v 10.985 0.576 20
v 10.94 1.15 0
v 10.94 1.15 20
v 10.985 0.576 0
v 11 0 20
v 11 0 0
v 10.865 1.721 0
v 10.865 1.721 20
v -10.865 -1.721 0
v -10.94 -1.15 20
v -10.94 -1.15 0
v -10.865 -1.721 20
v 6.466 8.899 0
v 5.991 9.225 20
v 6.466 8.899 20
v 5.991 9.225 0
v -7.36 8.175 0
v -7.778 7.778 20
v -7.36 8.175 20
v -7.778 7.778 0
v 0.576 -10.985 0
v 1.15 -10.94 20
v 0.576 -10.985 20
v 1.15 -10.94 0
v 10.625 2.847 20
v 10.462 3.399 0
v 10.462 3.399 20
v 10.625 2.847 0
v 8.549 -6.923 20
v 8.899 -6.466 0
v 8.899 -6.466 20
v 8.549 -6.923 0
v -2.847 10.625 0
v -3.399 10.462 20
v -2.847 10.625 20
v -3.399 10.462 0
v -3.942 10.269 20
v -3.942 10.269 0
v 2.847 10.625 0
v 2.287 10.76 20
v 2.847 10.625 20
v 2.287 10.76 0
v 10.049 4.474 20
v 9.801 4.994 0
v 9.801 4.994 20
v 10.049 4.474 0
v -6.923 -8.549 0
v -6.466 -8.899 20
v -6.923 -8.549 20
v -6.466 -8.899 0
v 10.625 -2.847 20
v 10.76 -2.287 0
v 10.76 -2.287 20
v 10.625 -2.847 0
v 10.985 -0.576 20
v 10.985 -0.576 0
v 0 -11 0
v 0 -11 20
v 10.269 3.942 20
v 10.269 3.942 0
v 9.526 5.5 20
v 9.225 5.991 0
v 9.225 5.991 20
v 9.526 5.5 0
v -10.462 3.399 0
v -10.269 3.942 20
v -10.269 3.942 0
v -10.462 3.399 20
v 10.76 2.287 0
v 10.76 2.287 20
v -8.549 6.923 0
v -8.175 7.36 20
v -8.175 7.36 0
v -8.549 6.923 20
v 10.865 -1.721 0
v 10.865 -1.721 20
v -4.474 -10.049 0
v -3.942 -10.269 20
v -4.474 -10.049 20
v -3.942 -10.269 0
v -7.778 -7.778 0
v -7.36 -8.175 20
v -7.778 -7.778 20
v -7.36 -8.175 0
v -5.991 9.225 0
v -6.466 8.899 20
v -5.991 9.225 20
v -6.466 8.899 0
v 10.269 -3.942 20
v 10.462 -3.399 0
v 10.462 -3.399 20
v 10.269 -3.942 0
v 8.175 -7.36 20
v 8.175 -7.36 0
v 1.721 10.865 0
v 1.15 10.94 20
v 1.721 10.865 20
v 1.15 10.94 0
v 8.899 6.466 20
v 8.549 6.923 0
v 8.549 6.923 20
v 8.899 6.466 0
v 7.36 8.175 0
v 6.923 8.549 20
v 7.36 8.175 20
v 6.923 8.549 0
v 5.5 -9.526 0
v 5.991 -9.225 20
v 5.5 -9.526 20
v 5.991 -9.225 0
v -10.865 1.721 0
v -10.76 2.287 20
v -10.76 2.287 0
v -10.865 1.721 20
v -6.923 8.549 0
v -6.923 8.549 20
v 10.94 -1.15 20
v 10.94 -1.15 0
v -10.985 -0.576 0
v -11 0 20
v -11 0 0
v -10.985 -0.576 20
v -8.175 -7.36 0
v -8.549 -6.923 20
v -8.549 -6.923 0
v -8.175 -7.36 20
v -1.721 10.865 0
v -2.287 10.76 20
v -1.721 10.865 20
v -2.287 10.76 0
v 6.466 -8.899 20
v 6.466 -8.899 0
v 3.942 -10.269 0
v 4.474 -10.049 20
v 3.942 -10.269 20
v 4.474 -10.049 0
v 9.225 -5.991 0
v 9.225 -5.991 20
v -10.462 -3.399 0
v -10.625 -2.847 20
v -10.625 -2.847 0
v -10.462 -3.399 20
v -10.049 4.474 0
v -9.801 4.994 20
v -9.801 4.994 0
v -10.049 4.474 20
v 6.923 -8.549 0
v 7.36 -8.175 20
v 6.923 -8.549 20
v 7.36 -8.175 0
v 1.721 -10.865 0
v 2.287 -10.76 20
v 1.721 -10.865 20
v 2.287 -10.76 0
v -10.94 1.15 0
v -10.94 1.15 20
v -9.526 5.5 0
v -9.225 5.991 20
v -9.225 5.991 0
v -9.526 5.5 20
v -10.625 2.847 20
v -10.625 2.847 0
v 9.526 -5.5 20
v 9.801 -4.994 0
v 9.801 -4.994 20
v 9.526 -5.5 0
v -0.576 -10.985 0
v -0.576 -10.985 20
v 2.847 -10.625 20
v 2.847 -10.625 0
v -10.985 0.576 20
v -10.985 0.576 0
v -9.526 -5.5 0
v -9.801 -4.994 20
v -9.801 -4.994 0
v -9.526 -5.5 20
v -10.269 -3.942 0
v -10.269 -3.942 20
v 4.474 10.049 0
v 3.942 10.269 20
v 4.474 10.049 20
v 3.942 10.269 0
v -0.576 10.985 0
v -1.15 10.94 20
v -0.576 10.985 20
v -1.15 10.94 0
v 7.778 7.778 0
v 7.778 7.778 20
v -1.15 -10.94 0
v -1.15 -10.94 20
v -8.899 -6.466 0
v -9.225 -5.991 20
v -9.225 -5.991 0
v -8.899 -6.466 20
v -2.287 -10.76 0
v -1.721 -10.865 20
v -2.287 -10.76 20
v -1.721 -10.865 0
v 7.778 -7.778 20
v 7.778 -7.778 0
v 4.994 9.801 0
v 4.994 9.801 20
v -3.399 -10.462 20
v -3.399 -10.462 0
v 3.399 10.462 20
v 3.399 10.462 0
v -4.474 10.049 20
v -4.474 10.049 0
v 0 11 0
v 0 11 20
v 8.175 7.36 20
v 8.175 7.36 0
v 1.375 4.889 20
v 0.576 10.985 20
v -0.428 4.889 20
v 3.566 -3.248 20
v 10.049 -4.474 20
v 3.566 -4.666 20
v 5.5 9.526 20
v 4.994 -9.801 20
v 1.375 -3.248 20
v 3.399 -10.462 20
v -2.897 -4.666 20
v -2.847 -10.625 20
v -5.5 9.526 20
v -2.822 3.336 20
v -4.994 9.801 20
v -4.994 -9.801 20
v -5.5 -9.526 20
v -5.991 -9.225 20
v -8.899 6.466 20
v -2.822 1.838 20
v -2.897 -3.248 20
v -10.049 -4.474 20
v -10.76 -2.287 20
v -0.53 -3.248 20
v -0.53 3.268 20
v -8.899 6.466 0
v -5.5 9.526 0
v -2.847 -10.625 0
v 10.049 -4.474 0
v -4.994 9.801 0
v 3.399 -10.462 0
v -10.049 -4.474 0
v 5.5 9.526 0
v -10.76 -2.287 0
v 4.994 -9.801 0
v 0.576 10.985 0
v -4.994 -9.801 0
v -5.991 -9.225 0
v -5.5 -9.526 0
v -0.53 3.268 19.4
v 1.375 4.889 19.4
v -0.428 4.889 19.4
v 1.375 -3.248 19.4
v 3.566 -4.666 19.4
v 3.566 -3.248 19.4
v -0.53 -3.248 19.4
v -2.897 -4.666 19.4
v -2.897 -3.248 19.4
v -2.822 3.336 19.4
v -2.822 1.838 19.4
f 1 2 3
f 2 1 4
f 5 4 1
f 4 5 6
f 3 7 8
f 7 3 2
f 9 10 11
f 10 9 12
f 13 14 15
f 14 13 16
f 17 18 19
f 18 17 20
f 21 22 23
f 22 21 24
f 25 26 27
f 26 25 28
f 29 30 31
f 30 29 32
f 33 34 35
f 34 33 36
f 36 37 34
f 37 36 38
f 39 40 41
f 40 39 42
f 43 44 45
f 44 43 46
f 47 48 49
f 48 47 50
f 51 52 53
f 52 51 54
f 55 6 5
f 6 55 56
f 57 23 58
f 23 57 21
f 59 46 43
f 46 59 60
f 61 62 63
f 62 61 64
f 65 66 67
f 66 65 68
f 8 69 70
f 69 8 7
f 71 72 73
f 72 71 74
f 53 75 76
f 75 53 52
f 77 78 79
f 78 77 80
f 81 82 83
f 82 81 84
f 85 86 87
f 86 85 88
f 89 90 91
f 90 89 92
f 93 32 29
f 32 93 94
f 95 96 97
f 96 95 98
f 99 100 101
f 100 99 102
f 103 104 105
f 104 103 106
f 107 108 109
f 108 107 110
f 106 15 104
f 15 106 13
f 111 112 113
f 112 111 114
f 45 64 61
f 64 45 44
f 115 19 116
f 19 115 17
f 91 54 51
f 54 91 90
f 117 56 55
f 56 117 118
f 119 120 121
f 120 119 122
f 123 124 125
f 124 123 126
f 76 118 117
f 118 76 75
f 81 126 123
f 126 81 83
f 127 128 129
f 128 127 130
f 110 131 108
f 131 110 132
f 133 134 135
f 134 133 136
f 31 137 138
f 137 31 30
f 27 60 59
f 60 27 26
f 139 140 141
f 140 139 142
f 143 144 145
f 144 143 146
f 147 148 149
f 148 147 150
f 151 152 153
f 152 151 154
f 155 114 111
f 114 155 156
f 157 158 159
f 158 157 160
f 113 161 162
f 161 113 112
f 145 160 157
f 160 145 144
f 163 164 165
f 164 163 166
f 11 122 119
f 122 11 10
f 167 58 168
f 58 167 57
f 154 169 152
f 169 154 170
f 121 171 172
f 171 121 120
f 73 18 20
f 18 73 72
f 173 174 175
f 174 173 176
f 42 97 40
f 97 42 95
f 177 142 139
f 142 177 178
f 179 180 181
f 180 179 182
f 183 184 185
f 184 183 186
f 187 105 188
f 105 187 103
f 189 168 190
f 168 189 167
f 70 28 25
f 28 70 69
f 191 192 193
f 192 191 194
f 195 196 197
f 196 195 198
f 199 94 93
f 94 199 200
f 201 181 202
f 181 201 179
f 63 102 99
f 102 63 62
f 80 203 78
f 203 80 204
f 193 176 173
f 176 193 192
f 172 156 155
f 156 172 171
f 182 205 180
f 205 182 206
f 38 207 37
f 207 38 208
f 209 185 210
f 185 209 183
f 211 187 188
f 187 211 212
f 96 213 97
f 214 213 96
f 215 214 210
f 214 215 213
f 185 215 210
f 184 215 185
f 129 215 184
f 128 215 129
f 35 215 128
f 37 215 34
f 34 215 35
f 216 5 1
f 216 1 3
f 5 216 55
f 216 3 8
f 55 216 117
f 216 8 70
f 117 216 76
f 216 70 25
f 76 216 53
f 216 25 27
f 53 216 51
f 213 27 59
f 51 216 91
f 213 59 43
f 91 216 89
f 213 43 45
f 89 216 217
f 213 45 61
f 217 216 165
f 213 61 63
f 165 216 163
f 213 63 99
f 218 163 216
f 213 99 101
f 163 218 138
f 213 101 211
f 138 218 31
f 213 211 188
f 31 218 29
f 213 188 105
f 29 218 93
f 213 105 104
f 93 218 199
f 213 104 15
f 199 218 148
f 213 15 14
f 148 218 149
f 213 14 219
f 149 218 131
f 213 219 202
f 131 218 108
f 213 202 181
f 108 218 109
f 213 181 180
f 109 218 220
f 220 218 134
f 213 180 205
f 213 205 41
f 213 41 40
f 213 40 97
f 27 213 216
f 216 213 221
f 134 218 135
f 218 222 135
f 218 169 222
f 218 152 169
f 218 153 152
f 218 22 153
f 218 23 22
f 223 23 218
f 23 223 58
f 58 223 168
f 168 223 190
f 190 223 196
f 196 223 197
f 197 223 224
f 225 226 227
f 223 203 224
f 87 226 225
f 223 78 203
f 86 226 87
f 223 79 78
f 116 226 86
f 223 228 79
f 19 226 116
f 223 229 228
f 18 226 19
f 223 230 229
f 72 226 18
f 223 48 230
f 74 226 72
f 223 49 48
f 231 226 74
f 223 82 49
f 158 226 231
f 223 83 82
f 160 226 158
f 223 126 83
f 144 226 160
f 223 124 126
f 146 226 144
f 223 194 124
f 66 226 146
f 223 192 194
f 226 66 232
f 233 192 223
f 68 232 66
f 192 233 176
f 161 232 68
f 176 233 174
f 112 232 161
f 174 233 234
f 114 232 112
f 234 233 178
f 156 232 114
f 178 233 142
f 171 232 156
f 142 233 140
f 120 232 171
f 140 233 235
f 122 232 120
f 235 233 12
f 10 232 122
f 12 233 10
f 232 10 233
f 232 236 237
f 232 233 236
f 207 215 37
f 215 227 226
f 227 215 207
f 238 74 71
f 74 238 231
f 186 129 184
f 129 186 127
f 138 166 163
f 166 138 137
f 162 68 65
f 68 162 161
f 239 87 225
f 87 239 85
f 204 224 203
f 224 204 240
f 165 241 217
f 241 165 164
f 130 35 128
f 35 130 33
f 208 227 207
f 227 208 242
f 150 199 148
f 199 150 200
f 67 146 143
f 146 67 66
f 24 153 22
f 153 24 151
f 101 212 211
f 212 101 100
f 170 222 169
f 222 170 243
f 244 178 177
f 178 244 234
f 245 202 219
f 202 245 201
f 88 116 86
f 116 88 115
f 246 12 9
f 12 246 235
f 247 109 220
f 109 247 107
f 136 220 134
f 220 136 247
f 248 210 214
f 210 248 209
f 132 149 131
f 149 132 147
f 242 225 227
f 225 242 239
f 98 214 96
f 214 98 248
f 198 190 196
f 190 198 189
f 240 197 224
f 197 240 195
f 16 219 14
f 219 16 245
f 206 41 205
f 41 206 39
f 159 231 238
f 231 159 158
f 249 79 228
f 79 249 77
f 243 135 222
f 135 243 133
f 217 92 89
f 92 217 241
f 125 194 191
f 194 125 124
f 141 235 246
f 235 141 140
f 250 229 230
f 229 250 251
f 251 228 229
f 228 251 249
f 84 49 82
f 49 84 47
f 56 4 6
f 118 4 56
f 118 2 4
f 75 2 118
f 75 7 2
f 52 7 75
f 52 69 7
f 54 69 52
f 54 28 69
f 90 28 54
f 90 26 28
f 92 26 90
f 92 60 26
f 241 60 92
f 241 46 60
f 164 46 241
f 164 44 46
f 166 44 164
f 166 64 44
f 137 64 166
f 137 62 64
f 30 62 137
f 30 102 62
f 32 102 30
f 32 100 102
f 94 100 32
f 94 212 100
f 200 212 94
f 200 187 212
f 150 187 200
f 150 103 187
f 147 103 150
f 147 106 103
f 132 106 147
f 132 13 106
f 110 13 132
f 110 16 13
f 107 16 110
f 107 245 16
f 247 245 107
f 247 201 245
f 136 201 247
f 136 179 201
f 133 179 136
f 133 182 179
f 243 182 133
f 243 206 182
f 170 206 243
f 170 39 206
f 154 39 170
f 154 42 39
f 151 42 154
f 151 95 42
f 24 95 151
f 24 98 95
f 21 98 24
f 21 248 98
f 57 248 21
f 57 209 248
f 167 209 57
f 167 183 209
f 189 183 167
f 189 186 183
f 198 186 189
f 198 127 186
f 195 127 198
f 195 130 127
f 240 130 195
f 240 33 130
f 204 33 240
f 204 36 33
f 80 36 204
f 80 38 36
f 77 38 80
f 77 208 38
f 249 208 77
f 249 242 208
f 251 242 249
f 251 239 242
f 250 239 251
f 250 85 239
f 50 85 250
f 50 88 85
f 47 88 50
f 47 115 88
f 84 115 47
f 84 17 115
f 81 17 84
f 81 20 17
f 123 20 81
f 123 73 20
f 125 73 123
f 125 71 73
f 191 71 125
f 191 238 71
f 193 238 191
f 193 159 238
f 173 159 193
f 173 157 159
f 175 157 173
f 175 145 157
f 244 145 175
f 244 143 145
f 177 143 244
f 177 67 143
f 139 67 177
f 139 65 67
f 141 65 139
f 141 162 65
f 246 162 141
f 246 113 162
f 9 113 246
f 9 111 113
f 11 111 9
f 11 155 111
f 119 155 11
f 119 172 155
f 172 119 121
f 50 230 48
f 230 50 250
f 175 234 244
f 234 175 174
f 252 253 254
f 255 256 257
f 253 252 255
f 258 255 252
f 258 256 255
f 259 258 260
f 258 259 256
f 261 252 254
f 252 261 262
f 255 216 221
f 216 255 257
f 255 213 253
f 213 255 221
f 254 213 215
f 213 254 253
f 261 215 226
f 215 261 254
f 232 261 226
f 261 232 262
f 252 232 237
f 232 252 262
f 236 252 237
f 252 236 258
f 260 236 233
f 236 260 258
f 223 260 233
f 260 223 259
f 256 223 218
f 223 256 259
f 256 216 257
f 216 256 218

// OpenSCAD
// Seam test cylinder (26 Nov 2026): 22 mm across, 20 mm tall, its number cut 0.6 mm into the top so each variant is told
// apart after printing. Four of these go on one plate with different per-object seam settings (see build.py).
n = 1;
$fn = 120;
difference() {
  cylinder(d = 22, h = 20);
  translate([0, 0, 19.4]) linear_extrude(1) text(str(n), size = 10, font = "Liberation Sans:style=Bold", halign = "center", valign = "center");
}
